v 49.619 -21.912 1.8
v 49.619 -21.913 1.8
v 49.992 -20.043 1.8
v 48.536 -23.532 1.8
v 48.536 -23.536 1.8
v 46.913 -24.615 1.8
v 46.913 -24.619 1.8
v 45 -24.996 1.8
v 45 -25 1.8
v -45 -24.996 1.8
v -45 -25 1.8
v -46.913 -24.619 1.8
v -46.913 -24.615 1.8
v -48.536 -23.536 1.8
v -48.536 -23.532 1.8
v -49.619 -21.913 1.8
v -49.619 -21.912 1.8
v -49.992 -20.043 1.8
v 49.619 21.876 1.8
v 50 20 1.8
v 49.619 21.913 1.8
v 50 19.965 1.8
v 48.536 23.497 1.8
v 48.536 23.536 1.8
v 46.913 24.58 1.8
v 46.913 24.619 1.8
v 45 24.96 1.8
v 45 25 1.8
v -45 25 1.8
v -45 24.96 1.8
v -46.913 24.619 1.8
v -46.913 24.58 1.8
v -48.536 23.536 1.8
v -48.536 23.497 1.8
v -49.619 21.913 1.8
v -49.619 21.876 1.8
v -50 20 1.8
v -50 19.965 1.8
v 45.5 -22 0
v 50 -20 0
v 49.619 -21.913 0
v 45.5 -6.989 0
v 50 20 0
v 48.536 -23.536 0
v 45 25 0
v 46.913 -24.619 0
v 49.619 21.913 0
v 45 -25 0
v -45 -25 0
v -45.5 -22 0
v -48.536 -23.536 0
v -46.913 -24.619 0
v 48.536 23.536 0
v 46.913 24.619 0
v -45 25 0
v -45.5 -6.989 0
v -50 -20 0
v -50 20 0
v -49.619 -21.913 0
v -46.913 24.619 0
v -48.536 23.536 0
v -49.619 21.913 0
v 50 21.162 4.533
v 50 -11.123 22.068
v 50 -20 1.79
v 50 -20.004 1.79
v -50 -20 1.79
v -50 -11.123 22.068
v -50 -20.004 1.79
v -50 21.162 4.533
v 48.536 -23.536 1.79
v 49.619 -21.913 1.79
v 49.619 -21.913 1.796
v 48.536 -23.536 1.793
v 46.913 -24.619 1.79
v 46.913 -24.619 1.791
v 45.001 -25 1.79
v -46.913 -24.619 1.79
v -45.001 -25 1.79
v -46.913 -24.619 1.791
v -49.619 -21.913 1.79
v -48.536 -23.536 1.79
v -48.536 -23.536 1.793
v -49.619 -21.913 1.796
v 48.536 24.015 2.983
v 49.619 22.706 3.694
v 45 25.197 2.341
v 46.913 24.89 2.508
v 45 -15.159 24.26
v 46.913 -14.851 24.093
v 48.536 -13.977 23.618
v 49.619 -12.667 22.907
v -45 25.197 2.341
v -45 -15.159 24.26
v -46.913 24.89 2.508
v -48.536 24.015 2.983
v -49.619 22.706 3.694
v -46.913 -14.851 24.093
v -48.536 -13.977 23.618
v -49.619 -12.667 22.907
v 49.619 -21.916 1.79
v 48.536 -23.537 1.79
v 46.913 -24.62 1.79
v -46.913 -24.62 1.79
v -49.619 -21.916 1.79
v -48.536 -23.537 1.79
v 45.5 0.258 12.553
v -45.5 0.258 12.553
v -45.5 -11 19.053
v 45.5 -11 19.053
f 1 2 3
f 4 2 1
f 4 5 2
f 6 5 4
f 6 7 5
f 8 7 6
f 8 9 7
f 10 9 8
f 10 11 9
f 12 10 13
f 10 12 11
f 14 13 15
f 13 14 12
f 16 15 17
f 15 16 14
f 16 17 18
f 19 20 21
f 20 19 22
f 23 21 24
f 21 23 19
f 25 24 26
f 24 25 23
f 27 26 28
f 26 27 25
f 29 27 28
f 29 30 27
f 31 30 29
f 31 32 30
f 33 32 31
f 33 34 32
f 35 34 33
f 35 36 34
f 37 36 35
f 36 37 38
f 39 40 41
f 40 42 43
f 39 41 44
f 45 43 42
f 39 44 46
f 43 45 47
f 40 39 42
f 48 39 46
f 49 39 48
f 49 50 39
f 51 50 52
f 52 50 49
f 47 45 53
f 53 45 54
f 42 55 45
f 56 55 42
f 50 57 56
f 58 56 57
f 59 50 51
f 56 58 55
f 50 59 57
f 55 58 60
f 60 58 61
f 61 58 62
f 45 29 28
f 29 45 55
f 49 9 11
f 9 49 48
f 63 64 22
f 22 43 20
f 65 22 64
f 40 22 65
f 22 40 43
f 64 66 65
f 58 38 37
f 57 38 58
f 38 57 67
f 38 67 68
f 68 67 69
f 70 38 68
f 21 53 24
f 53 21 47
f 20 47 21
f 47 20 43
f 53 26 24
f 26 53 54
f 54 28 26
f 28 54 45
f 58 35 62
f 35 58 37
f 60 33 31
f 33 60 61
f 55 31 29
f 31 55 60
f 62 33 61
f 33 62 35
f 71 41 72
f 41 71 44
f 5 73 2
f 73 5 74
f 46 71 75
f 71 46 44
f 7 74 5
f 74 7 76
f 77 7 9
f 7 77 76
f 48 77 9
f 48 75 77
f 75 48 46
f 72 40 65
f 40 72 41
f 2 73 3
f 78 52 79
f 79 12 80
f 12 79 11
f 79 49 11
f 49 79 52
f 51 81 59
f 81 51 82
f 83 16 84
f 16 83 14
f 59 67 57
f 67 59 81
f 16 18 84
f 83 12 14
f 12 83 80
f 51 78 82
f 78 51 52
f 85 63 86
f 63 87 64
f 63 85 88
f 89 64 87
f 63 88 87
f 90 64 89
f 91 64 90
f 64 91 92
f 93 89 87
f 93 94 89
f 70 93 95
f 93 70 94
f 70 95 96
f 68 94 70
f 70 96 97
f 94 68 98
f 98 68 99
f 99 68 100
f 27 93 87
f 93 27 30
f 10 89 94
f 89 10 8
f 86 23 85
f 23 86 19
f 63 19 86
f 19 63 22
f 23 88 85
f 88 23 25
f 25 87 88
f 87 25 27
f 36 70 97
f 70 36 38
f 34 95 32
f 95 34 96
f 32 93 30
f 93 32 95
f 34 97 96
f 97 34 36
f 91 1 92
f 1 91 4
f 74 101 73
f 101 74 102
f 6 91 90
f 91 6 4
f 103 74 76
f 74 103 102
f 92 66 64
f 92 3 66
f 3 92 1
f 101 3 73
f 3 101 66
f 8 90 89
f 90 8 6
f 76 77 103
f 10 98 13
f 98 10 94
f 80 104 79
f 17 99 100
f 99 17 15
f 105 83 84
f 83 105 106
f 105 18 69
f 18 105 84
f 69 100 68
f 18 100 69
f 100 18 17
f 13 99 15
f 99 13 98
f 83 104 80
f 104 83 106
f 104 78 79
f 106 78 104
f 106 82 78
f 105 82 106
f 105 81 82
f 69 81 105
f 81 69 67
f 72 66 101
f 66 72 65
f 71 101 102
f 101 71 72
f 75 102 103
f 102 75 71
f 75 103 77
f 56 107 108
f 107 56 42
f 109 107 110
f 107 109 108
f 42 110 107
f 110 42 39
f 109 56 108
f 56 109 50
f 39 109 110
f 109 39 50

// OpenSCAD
/* [Color One] */

// Load a 150x40 pixel image. This is the artwork for the first colour in the logo. The background should be black and the logo white. If not, make sure to click the Invert Colors checkbox.
tone_one = "tone_one.dat"; // [image_surface:150x40]

// What Z height would you like to pause the printer to change the filament for the first logo color (mm)?
z_height_one = 0.6;

/* [Color Two] */

// Load a  150x40 pixel image. This is the artwork for the second colour in the logo. The background should be black and the logo white. If not, make sure to click the Invert Colors checkbox.
tone_two = "tone_two.dat"; // [image_surface:150x40]

// What Z height would you like to pause the printer to change the filament for the second logo color (mm)?
z_height_two = 1.2;

/* [Hidden] */

holder_x = 100;
holder_y = 50;
holder_z = 25;
card_x = 91;
card_y = 13;
card_z = 22;
corner_radius = 5;
box_x = holder_x - (corner_radius * 2);
box_y = holder_y - (corner_radius * 2);
face_z = z_height_one + z_height_two;
offset_x = (holder_x / 2) - corner_radius;
offset_y = (holder_y / 2) - corner_radius;
logo_x = 90;
logo_y = 24;
scale_x = 150;
scale_y = 40;

difference() {
	translate([0, 0, face_z]) {
		translate([0, 0, -(face_z/2)]) {
			cube([box_x, holder_y, face_z], center=true);
			cube([holder_x, box_y, face_z], center=true);
			translate([ offset_x,  offset_y, 0]) cylinder(h=face_z, r=corner_radius, center=true);
			translate([-offset_x,  offset_y, 0]) cylinder(h=face_z, r=corner_radius, center=true);
			translate([ offset_x, -offset_y, 0]) cylinder(h=face_z, r=corner_radius, center=true);
			translate([-offset_x, -offset_y, 0]) cylinder(h=face_z, r=corner_radius, center=true);
		}
		translate([0, -holder_y / 2, -0.01]) scale([1, 0.898, 1]) rotate([-26, 0, 0]) difference() {
			translate([0, holder_y / 2, holder_z/2]) {
				cube([box_x, holder_y, holder_z], center=true);
				cube([holder_x, box_y, holder_z], center=true);
				translate([ offset_x,  offset_y, 0]) cylinder(h=holder_z, r=corner_radius, center=true);
				translate([-offset_x,  offset_y, 0]) cylinder(h=holder_z, r=corner_radius, center=true);
				translate([ offset_x, -offset_y, 0]) cylinder(h=holder_z, r=corner_radius, center=true);
				translate([-offset_x, -offset_y, 0]) cylinder(h=holder_z, r=corner_radius, center=true);
			}
			rotate([26, 0, 0]) translate([0, holder_y / 2, -holder_z/2]) cube([holder_x + 1, holder_y * 4/3, holder_z], center=true);
		}
	}
	translate([0, -holder_y/2+3, 0]) rotate([-30, 0, 0]) translate([0, card_y/2, 0]) cube([card_x, card_y, card_z*2], center=true);
	translate([0, (logo_y/2)-3, -0.01]) rotate([0, 0, 180]) {
		scale([(logo_x)/scale_x, (logo_y)/scale_y, z_height_one]) surface(file=tone_one, center=true, convexity=5);
		scale([(logo_x)/scale_x, (logo_y)/scale_y, z_height_two]) surface(file=tone_two, center=true, convexity=5);
	}
}
